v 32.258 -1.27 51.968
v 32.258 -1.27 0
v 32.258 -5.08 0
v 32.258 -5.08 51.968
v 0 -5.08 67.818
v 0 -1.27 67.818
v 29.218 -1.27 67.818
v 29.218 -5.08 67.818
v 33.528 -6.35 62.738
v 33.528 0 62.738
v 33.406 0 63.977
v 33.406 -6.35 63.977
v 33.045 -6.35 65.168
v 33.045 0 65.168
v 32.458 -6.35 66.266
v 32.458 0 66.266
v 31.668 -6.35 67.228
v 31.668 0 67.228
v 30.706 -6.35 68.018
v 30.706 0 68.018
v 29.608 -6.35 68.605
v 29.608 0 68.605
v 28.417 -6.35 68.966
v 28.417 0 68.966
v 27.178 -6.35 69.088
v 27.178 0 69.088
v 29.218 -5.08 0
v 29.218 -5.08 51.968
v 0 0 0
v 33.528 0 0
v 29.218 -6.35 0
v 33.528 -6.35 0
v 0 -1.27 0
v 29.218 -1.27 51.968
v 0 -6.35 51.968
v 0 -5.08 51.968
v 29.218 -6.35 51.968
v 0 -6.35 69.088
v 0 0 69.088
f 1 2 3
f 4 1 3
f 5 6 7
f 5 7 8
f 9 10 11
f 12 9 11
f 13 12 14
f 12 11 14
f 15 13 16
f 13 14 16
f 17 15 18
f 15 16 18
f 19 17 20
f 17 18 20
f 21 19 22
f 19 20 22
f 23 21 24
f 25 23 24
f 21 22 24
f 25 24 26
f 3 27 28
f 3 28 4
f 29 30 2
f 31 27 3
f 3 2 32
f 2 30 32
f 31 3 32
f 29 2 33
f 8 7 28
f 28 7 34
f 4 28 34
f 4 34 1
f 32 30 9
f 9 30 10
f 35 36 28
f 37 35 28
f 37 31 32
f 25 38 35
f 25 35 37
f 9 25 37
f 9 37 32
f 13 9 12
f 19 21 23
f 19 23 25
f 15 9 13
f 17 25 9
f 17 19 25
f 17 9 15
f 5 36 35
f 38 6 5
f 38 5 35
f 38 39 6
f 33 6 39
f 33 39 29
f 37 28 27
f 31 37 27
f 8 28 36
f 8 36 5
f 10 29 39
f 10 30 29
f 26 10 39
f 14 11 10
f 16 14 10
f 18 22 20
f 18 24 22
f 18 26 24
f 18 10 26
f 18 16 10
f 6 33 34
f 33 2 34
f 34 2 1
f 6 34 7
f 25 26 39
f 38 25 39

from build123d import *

# Parameters (mm, degrees)
F1_DEPTH = 6.35
F2_W     = 3.81
F2_H     = 15.8496
F3_DEPTH = 29.21762
F4_W     = 3.04038
F4_H     = 3.81
F5_DEPTH = 51.9684
F6_W     = 1.27
F6_H     = 51.9684
F7_DEPTH = 29.21762


with BuildPart() as f1:
    # F0 (on Front) → F1 (new body)
    with BuildSketch(Plane.XZ):
        with BuildLine():
            Line((27.178, 69.088), (0, 69.088))
            Line((0, 69.088), (0, 51.9684))
            Line((0, 51.9684), (29.21762, 51.9684))
            Line((29.21762, 51.9684), (29.21762, 0))
            Line((29.21762, 0), (33.528, 0))
            Line((33.528, 0), (33.528, 62.738))
            ThreePointArc((33.528, 62.738), (31.668128, 67.228128), (27.178, 69.088))
        make_face()
    extrude(amount=F1_DEPTH)

    # F2 (on face) → F3 (cut)
    with BuildSketch(Plane(origin=(0, 0, 0), x_dir=(0, -1, 0), z_dir=(-1, 0, 0))):
        with Locations((3.175, 59.8932)):
            Rectangle(F2_W, F2_H)
    extrude(amount=-F3_DEPTH, mode=Mode.SUBTRACT)

    # F4 (on face) → F5 (cut)
    with BuildSketch(Plane(origin=(0, 0, 0), x_dir=(1, 0, 0), z_dir=(0, 0, -1))):
        with Locations((30.73781, 3.175)):
            Rectangle(F4_W, F4_H)
    extrude(amount=-F5_DEPTH, mode=Mode.SUBTRACT)

    # F6 (on face) → F7 (join, through all)
    with BuildSketch(Plane(origin=(29.21762, 0, 0), x_dir=(0, -1, 0), z_dir=(-1, 0, 0))):
        with Locations((0.635, 25.9842)):
            Rectangle(F6_W, F6_H)
    extrude(amount=F7_DEPTH)


solid = f1.part
